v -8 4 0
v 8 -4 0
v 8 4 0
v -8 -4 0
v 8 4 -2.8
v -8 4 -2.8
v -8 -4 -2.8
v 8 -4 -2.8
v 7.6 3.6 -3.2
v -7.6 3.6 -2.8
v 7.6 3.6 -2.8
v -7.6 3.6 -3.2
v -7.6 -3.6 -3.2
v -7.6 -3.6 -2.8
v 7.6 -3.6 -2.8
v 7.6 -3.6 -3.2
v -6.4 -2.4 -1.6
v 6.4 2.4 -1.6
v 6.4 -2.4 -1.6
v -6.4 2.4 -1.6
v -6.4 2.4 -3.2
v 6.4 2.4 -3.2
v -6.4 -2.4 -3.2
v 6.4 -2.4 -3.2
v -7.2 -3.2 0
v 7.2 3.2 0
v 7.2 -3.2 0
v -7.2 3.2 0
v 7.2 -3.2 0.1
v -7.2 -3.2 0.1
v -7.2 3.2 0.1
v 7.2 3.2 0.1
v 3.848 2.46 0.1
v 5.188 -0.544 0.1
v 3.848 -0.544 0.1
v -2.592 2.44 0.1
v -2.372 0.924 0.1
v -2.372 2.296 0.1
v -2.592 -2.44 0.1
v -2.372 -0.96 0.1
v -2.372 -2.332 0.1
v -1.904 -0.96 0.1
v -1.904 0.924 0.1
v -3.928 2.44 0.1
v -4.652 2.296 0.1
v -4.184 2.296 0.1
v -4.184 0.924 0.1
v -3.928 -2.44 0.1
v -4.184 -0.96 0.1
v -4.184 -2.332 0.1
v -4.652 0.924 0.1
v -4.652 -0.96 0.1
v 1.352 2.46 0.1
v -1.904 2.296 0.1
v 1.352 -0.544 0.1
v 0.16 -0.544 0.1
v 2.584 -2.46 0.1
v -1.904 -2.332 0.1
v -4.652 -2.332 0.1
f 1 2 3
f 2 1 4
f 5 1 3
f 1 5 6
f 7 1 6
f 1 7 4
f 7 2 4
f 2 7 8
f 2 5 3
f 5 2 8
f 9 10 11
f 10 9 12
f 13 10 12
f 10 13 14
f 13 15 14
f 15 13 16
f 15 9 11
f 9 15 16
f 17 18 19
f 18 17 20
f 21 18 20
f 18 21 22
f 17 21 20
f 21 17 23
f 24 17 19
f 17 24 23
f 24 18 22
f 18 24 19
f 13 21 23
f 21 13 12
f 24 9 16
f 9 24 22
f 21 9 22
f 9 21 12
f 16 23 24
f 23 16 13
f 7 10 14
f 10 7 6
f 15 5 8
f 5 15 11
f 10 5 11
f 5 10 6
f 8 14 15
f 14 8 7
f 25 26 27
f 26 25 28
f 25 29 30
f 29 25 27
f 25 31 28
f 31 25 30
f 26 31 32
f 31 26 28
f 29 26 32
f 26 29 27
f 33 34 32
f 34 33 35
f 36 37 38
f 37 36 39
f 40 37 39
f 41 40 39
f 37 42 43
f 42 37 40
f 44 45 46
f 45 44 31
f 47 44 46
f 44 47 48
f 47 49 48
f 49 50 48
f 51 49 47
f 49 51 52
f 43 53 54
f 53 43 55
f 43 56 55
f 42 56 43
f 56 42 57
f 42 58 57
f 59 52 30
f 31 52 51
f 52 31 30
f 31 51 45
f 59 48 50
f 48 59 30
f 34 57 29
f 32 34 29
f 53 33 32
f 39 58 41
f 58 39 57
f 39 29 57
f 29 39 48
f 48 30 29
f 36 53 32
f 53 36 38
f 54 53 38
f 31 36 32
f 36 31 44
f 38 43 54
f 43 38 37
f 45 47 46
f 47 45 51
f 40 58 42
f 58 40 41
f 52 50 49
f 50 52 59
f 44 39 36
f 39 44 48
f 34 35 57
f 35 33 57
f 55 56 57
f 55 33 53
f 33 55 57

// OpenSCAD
// file: ../p/box5-12.scad
use <../lib.scad>
function ldraw_lib__box5_12() = [
// 0 Box with 5 Faces without Any Edges
// 0 Name: box5-12.dat
// 0 Author: Chris Dee [cwdee]
// 0 !LDRAW_ORG Primitive UPDATE 2009-02
// 0 !LICENSE Licensed under CC BY 4.0 : see CAreadme.txt
// 
// 0 BFC CERTIFY CCW
  [0,"BFC","CERTIFY"],
  [0,"BFC","CCW"],
// 
// 0 !HISTORY 2009-09-03 [PTadmin] Official Update 2009-02
// 
// 
// 4 16 1 1 1 1 1 -1 -1 1 -1 -1 1 1
  [4,16,1,1,1,1,1,-1,-1,1,-1,-1,1,1],
// 4 16 -1 0 1 1 0 1 1 1 1 -1 1 1
  [4,16,-1,0,1,1,0,1,1,1,1,-1,1,1],
// 4 16 -1 0 -1 -1 0 1 -1 1 1 -1 1 -1
  [4,16,-1,0,-1,-1,0,1,-1,1,1,-1,1,-1],
// 4 16 1 0 -1 -1 0 -1 -1 1 -1 1 1 -1
  [4,16,1,0,-1,-1,0,-1,-1,1,-1,1,1,-1],
// 4 16 1 0 1 1 0 -1 1 1 -1 1 1 1
  [4,16,1,0,1,1,0,-1,1,1,-1,1,1,1],
// 0
];
module ldraw_lib__box5_12(step=0, col=false, unit=2/5, alt=false, line=0.2, solid=!$preview)
    makepoly(ldraw_lib__box5_12(), step=step, col=col, unit=unit, alt=alt, line=line, solid=solid);
ldraw_lib__box5_12(line=0.2);
// file: ../p/box5.scad
use <../lib.scad>
function ldraw_lib__box5() = [
// 0 Box with 5 Faces and All Edges
// 0 Name: box5.dat
// 0 Author: James Jessiman
// 0 !LDRAW_ORG Primitive UPDATE 2012-01
// 0 !LICENSE Licensed under CC BY 4.0 : see CAreadme.txt
// 
// 0 BFC CERTIFY CCW
  [0,"BFC","CERTIFY"],
  [0,"BFC","CCW"],
// 
// 0 !HISTORY 2002-04-03 [sbliss] Modified for BFC compliance
// 0 !HISTORY 2002-04-25 [PTadmin] Official Update 2002-02
// 0 !HISTORY 2007-06-24 [PTadmin] Header formatted for Contributor Agreement
// 0 !HISTORY 2008-07-01 [PTadmin] Official Update 2008-01
// 0 !HISTORY 2012-02-16 [Philo] Changed to CCW
// 0 !HISTORY 2012-03-30 [PTadmin] Official Update 2012-01
// 
// 
// 2 24 1 1 1 -1 1 1
  [2,24,1,1,1,-1,1,1],
// 2 24 -1 1 1 -1 1 -1
  [2,24,-1,1,1,-1,1,-1],
// 2 24 -1 1 -1 1 1 -1
  [2,24,-1,1,-1,1,1,-1],
// 2 24 1 1 -1 1 1 1
  [2,24,1,1,-1,1,1,1],
// 2 24 1 0 1 -1 0 1
  [2,24,1,0,1,-1,0,1],
// 2 24 -1 0 1 -1 0 -1
  [2,24,-1,0,1,-1,0,-1],
// 2 24 -1 0 -1 1 0 -1
  [2,24,-1,0,-1,1,0,-1],
// 2 24 1 0 -1 1 0 1
  [2,24,1,0,-1,1,0,1],
// 2 24 1 0 1 1 1 1
  [2,24,1,0,1,1,1,1],
// 2 24 -1 0 1 -1 1 1
  [2,24,-1,0,1,-1,1,1],
// 2 24 1 0 -1 1 1 -1
  [2,24,1,0,-1,1,1,-1],
// 2 24 -1 0 -1 -1 1 -1
  [2,24,-1,0,-1,-1,1,-1],
// 4 16 -1 1 1 1 1 1 1 1 -1 -1 1 -1
  [4,16,-1,1,1,1,1,1,1,1,-1,-1,1,-1],
// 4 16 -1 1 1 -1 0 1 1 0 1 1 1 1
  [4,16,-1,1,1,-1,0,1,1,0,1,1,1,1],
// 4 16 -1 1 -1 -1 0 -1 -1 0 1 -1 1 1
  [4,16,-1,1,-1,-1,0,-1,-1,0,1,-1,1,1],
// 4 16 1 1 -1 1 0 -1 -1 0 -1 -1 1 -1
  [4,16,1,1,-1,1,0,-1,-1,0,-1,-1,1,-1],
// 4 16 1 1 1 1 0 1 1 0 -1 1 1 -1
  [4,16,1,1,1,1,0,1,1,0,-1,1,1,-1],
];
module ldraw_lib__box5(step=0, col=false, unit=2/5, alt=false, line=0.2, solid=!$preview)
    makepoly(ldraw_lib__box5(), step=step, col=col, unit=unit, alt=alt, line=line, solid=solid);
ldraw_lib__box5(line=0.2);
// file: ../p/box4.scad
use <../lib.scad>
function ldraw_lib__box4() = [
// 0 Box with 4 Faces (2 Parallel Pairs) and All Edges
// 0 Name: box4.dat
// 0 Author: James Jessiman
// 0 !LDRAW_ORG Primitive UPDATE 2012-01
// 0 !LICENSE Licensed under CC BY 4.0 : see CAreadme.txt
// 
// 0 BFC CERTIFY CCW
  [0,"BFC","CERTIFY"],
  [0,"BFC","CCW"],
// 
// 0 !HISTORY 2002-04-03 [sbliss] Modified for BFC compliance
// 0 !HISTORY 2002-04-25 [PTadmin] Official Update 2002-02
// 0 !HISTORY 2007-06-24 [PTadmin] Header formatted for Contributor Agreement
// 0 !HISTORY 2008-07-01 [PTadmin] Official Update 2008-01
// 0 !HISTORY 2012-02-16 [Philo] Changed to CCW
// 0 !HISTORY 2012-03-30 [PTadmin] Official Update 2012-01
// 
// 
// 2 24 1 1 1 -1 1 1
  [2,24,1,1,1,-1,1,1],
// 2 24 -1 1 1 -1 1 -1
  [2,24,-1,1,1,-1,1,-1],
// 2 24 -1 1 -1 1 1 -1
  [2,24,-1,1,-1,1,1,-1],
// 2 24 1 1 -1 1 1 1
  [2,24,1,1,-1,1,1,1],
// 2 24 1 0 1 -1 0 1
  [2,24,1,0,1,-1,0,1],
// 2 24 -1 0 1 -1 0 -1
  [2,24,-1,0,1,-1,0,-1],
// 2 24 -1 0 -1 1 0 -1
  [2,24,-1,0,-1,1,0,-1],
// 2 24 1 0 -1 1 0 1
  [2,24,1,0,-1,1,0,1],
// 2 24 1 0 1 1 1 1
  [2,24,1,0,1,1,1,1],
// 2 24 -1 0 1 -1 1 1
  [2,24,-1,0,1,-1,1,1],
// 2 24 1 0 -1 1 1 -1
  [2,24,1,0,-1,1,1,-1],
// 2 24 -1 0 -1 -1 1 -1
  [2,24,-1,0,-1,-1,1,-1],
// 4 16 -1 1 1 -1 0 1 1 0 1 1 1 1
  [4,16,-1,1,1,-1,0,1,1,0,1,1,1,1],
// 4 16 -1 1 -1 -1 0 -1 -1 0 1 -1 1 1
  [4,16,-1,1,-1,-1,0,-1,-1,0,1,-1,1,1],
// 4 16 1 1 -1 1 0 -1 -1 0 -1 -1 1 -1
  [4,16,1,1,-1,1,0,-1,-1,0,-1,-1,1,-1],
// 4 16 1 1 1 1 0 1 1 0 -1 1 1 -1
  [4,16,1,1,1,1,0,1,1,0,-1,1,1,-1],
];
module ldraw_lib__box4(step=0, col=false, unit=2/5, alt=false, line=0.2, solid=!$preview)
    makepoly(ldraw_lib__box4(), step=step, col=col, unit=unit, alt=alt, line=line, solid=solid);
ldraw_lib__box4(line=0.2);
// file: 821577e.scad
use <../lib.scad>
use <../p/box5-12.scad>
function ldraw_lib__821577e() = [
// 0 Sticker  0.8 x  1.8 with Car and Red Straight Arrow Up
// 0 Name: 821577e.dat
// 0 Author: Evert-Jan Boer [ejboer]
// 0 !LDRAW_ORG Part UPDATE 2026-07
// 0 !LICENSE Licensed under CC BY 4.0 : see CAreadme.txt
// 
// 0 BFC CERTIFY CCW
  [0,"BFC","CERTIFY"],
  [0,"BFC","CCW"],
// 
// 0 !CATEGORY Sticker
// 0 !KEYWORDS Multi Control, Set 8082
// 
// 0 !HISTORY 2026-07-30 [OrionP] Official Update 2026-07
// 
// 1 16 0 -.25 0 18 0 0 0 0.25 0 0 0 8 box5-12.dat
  [1,16,0,-.25,0,18,0,0,0,0.25,0,0,0,8, ldraw_lib__box5_12()],
// 4 16 12.97 -.25 1.36 9.62 -.25 1.36 9.62 -.25 -6.15 18 -.25 -8
  [4,16,12.97,-.25,1.36,9.62,-.25,1.36,9.62,-.25,-6.15,18,-.25,-8],
// 4 16 -5.93 -.25 -5.74 -5.93 -.25 -2.31 -6.48 -.25 6.1 -6.48 -.25 -6.1
  [4,16,-5.93,-.25,-5.74,-5.93,-.25,-2.31,-6.48,-.25,6.1,-6.48,-.25,-6.1],
// 3 16 -6.48 -.25 6.1 -5.93 -.25 -2.31 -5.93 -.25 2.4
  [3,16,-6.48,-.25,6.1,-5.93,-.25,-2.31,-5.93,-.25,2.4],
// 3 16 -6.48 -.25 6.1 -5.93 -.25 2.4 -5.93 -.25 5.83
  [3,16,-6.48,-.25,6.1,-5.93,-.25,2.4,-5.93,-.25,5.83],
// 4 16 -5.93 -.25 -2.31 -4.76 -.25 -2.31 -4.76 -.25 2.4 -5.93 -.25 2.4
  [4,16,-5.93,-.25,-2.31,-4.76,-.25,-2.31,-4.76,-.25,2.4,-5.93,-.25,2.4],
// 4 16 -9.82 -.25 -6.1 -10.46 -.25 -5.74 -11.63 -.25 -5.74 -18 -.25 -8
  [4,16,-9.82,-.25,-6.1,-10.46,-.25,-5.74,-11.63,-.25,-5.74,-18,-.25,-8],
// 4 16 -10.46 -.25 -5.74 -9.82 -.25 -6.1 -9.82 -.25 6.1 -10.46 -.25 -2.31
  [4,16,-10.46,-.25,-5.74,-9.82,-.25,-6.1,-9.82,-.25,6.1,-10.46,-.25,-2.31],
// 3 16 -9.82 -.25 6.1 -10.46 -.25 2.4 -10.46 -.25 -2.31
  [3,16,-9.82,-.25,6.1,-10.46,-.25,2.4,-10.46,-.25,-2.31],
// 3 16 -9.82 -.25 6.1 -10.46 -.25 5.83 -10.46 -.25 2.4
  [3,16,-9.82,-.25,6.1,-10.46,-.25,5.83,-10.46,-.25,2.4],
// 4 16 -10.46 -.25 2.4 -11.63 -.25 2.4 -11.63 -.25 -2.31 -10.46 -.25 -2.31
  [4,16,-10.46,-.25,2.4,-11.63,-.25,2.4,-11.63,-.25,-2.31,-10.46,-.25,-2.31],
// 4 16 3.38 -.25 -6.15 3.38 -.25 1.36 -4.76 -.25 -2.31 -4.76 -.25 -5.74
  [4,16,3.38,-.25,-6.15,3.38,-.25,1.36,-4.76,-.25,-2.31,-4.76,-.25,-5.74],
// 3 16 3.38 -.25 1.36 .4 -.25 1.36 -4.76 -.25 -2.31
  [3,16,3.38,-.25,1.36,.4,-.25,1.36,-4.76,-.25,-2.31],
// 4 16 -4.76 -.25 -2.31 .4 -.25 1.36 6.46 -.25 6.15 -4.76 -.25 2.4
  [4,16,-4.76,-.25,-2.31,.4,-.25,1.36,6.46,-.25,6.15,-4.76,-.25,2.4],
// 3 16 6.46 -.25 6.15 -4.76 -.25 5.83 -4.76 -.25 2.4
  [3,16,6.46,-.25,6.15,-4.76,-.25,5.83,-4.76,-.25,2.4],
// 3 16 -18 -.25 8 -11.63 -.25 2.4 -11.63 -.25 5.83
  [3,16,-18,-.25,8,-11.63,-.25,2.4,-11.63,-.25,5.83],
// 4 16 -11.63 -.25 -2.31 -11.63 -.25 2.4 -18 -.25 8 -18 -.25 -8
  [4,16,-11.63,-.25,-2.31,-11.63,-.25,2.4,-18,-.25,8,-18,-.25,-8],
// 3 16 -11.63 -.25 -5.74 -11.63 -.25 -2.31 -18 -.25 -8
  [3,16,-11.63,-.25,-5.74,-11.63,-.25,-2.31,-18,-.25,-8],
// 4 16 -10.46 -.25 5.83 -9.82 -.25 6.1 -18 -.25 8 -11.63 -.25 5.83
  [4,16,-10.46,-.25,5.83,-9.82,-.25,6.1,-18,-.25,8,-11.63,-.25,5.83],
// 3 16 18 -.25 8 6.46 -.25 6.15 12.97 -.25 1.36
  [3,16,18,-.25,8,6.46,-.25,6.15,12.97,-.25,1.36],
// 3 16 18 -.25 8 12.97 -.25 1.36 18 -.25 -8
  [3,16,18,-.25,8,12.97,-.25,1.36,18,-.25,-8],
// 3 16 18 -.25 -8 9.62 -.25 -6.15 3.38 -.25 -6.15
  [3,16,18,-.25,-8,9.62,-.25,-6.15,3.38,-.25,-6.15],
// 4 16 -6.48 -.25 6.1 -5.93 -.25 5.83 -4.76 -.25 5.83 6.46 -.25 6.15
  [4,16,-6.48,-.25,6.1,-5.93,-.25,5.83,-4.76,-.25,5.83,6.46,-.25,6.15],
// 4 16 -9.82 -.25 6.1 -6.48 -.25 6.1 6.46 -.25 6.15 18 -.25 8
  [4,16,-9.82,-.25,6.1,-6.48,-.25,6.1,6.46,-.25,6.15,18,-.25,8],
// 3 16 18 -.25 8 -18 -.25 8 -9.82 -.25 6.1
  [3,16,18,-.25,8,-18,-.25,8,-9.82,-.25,6.1],
// 4 16 18 -.25 -8 3.38 -.25 -6.15 -5.93 -.25 -5.74 -6.48 -.25 -6.1
  [4,16,18,-.25,-8,3.38,-.25,-6.15,-5.93,-.25,-5.74,-6.48,-.25,-6.1],
// 3 16 -5.93 -.25 -5.74 3.38 -.25 -6.15 -4.76 -.25 -5.74
  [3,16,-5.93,-.25,-5.74,3.38,-.25,-6.15,-4.76,-.25,-5.74],
// 4 16 -18 -.25 -8 18 -.25 -8 -6.48 -.25 -6.1 -9.82 -.25 -6.1
  [4,16,-18,-.25,-8,18,-.25,-8,-6.48,-.25,-6.1,-9.82,-.25,-6.1],
// 
// 0 BFC NOCLIP
  [0,"BFC","NOCLIP"],
// 
// 4 14 -5.93 -.25 -2.31 -5.93 -.25 -5.74 -4.76 -.25 -5.74 -4.76 -.25 -2.31
  [4,14,-5.93,-.25,-2.31,-5.93,-.25,-5.74,-4.76,-.25,-5.74,-4.76,-.25,-2.31],
// 4 14 -11.63 -.25 -2.31 -11.63 -.25 -5.74 -10.46 -.25 -5.74 -10.46 -.25 -2.31
  [4,14,-11.63,-.25,-2.31,-11.63,-.25,-5.74,-10.46,-.25,-5.74,-10.46,-.25,-2.31],
// 4 14 -5.93 -.25 5.83 -5.93 -.25 2.4 -4.76 -.25 2.4 -4.76 -.25 5.83
  [4,14,-5.93,-.25,5.83,-5.93,-.25,2.4,-4.76,-.25,2.4,-4.76,-.25,5.83],
// 4 14 -11.63 -.25 5.83 -11.63 -.25 2.4 -10.46 -.25 2.4 -10.46 -.25 5.83
  [4,14,-11.63,-.25,5.83,-11.63,-.25,2.4,-10.46,-.25,2.4,-10.46,-.25,5.83],
// 4 0 -9.82 -.25 6.1 -9.82 -.25 -6.1 -6.48 -.25 -6.1 -6.48 -.25 6.1
  [4,0,-9.82,-.25,6.1,-9.82,-.25,-6.1,-6.48,-.25,-6.1,-6.48,-.25,6.1],
// 3 4 6.46 -.25 6.15 9.62 -.25 1.36 12.97 -.25 1.36
  [3,4,6.46,-.25,6.15,9.62,-.25,1.36,12.97,-.25,1.36],
// 3 4 6.46 -.25 6.15 9.62 -.25 -6.15 9.62 -.25 1.36
  [3,4,6.46,-.25,6.15,9.62,-.25,-6.15,9.62,-.25,1.36],
// 3 4 6.46 -.25 6.15 .4 -.25 1.36 3.38 -.25 1.36
  [3,4,6.46,-.25,6.15,.4,-.25,1.36,3.38,-.25,1.36],
// 4 4 6.46 -.25 6.15 3.38 -.25 1.36 3.38 -.25 -6.15 9.62 -.25 -6.15
  [4,4,6.46,-.25,6.15,3.38,-.25,1.36,3.38,-.25,-6.15,9.62,-.25,-6.15],
];
module ldraw_lib__821577e(step=0, col=false, unit=2/5, alt=false, line=0.2, solid=!$preview)
    makepoly(ldraw_lib__821577e(), step=step, col=col, unit=unit, alt=alt, line=line, solid=solid);
ldraw_lib__821577e(line=0.2);
// file: s/3069bs01.scad
use <../../lib.scad>
use <../../p/box4.scad>
use <../../p/box5.scad>
function ldraw_lib__s__3069bs01() = [
// 0 ~Tile  1 x  2 with Groove without Top Face
// 0 Name: s\3069bs01.dat
// 0 Author: Santeri Piippo [arezey]
// 0 !LDRAW_ORG Subpart UPDATE 2010-02
// 0 !LICENSE Licensed under CC BY 4.0 : see CAreadme.txt
// 
// 0 BFC CERTIFY CCW
  [0,"BFC","CERTIFY"],
  [0,"BFC","CCW"],
// 
// 0 !HISTORY 2010-07-05 [PTadmin] Official Update 2010-02
// 
// 
// 1 16 0 0 0 20 0 0 0 7 0 0 0 10 box4.dat
  [1,16,0,0,0,20,0,0,0,7,0,0,0,10, ldraw_lib__box4()],
// 1 16 0 7 0 19 0 0 0 1 0 0 0 9 box4.dat
  [1,16,0,7,0,19,0,0,0,1,0,0,0,9, ldraw_lib__box4()],
// 0 BFC INVERTNEXT
  [0,"BFC","INVERTNEXT"],
// 1 16 0 8 0 16 0 0 0 -4 0 0 0 6 box5.dat
  [1,16,0,8,0,16,0,0,0,-4,0,0,0,6, ldraw_lib__box5()],
// 4 16 -19 8 9 -16 8 6 -16 8 -6 -19 8 -9
  [4,16,-19,8,9,-16,8,6,-16,8,-6,-19,8,-9],
// 4 16 19 8 -9 16 8 -6 16 8 6 19 8 9
  [4,16,19,8,-9,16,8,-6,16,8,6,19,8,9],
// 4 16 19 8 9 16 8 6 -16 8 6 -19 8 9
  [4,16,19,8,9,16,8,6,-16,8,6,-19,8,9],
// 4 16 -19 8 -9 -16 8 -6 16 8 -6 19 8 -9
  [4,16,-19,8,-9,-16,8,-6,16,8,-6,19,8,-9],
// 4 16 -20 7 10 -19 7 9 -19 7 -9 -20 7 -10
  [4,16,-20,7,10,-19,7,9,-19,7,-9,-20,7,-10],
// 4 16 20 7 -10 19 7 -9 19 7 9 20 7 10
  [4,16,20,7,-10,19,7,-9,19,7,9,20,7,10],
// 4 16 20 7 10 19 7 9 -19 7 9 -20 7 10
  [4,16,20,7,10,19,7,9,-19,7,9,-20,7,10],
// 4 16 -20 7 -10 -19 7 -9 19 7 -9 20 7 -10
  [4,16,-20,7,-10,-19,7,-9,19,7,-9,20,7,-10],
// 0 //
];
module ldraw_lib__s__3069bs01(step=0, col=false, unit=2/5, alt=false, line=0.2, solid=!$preview)
    makepoly(ldraw_lib__s__3069bs01(), step=step, col=col, unit=unit, alt=alt, line=line, solid=solid);
ldraw_lib__s__3069bs01(line=0.2);
// file: 821577f.scad
use <../lib.scad>
use <821577e.scad>
function ldraw_lib__821577f() = [
// 0 Sticker  0.8 x  1.8 with Car and Red Straight Arrow Down
// 0 Name: 821577f.dat
// 0 Author: Evert-Jan Boer [ejboer]
// 0 !LDRAW_ORG Part UPDATE 2026-07
// 0 !LICENSE Licensed under CC BY 4.0 : see CAreadme.txt
// 
// 0 BFC CERTIFY CCW
  [0,"BFC","CERTIFY"],
  [0,"BFC","CCW"],
// 
// 0 !CATEGORY Sticker
// 0 !KEYWORDS Multi Control, Set 8082
// 
// 0 !HISTORY 2026-07-30 [OrionP] Official Update 2026-07
// 
// 1 16 0 0 0 1 0 0 0 1 0 0 0 -1 821577e.dat
  [1,16,0,0,0,1,0,0,0,1,0,0,0,-1, ldraw_lib__821577e()],
];
module ldraw_lib__821577f(step=0, col=false, unit=2/5, alt=false, line=0.2, solid=!$preview)
    makepoly(ldraw_lib__821577f(), step=step, col=col, unit=unit, alt=alt, line=line, solid=solid);
ldraw_lib__821577f(line=0.2);
// file: 3069b.scad
use <../lib.scad>
use <s/3069bs01.scad>
function ldraw_lib__3069b() = [
// 0 Tile  1 x  2 with Groove
// 0 Name: 3069b.dat
// 0 Author: Santeri Piippo [arezey]
// 0 !LDRAW_ORG Part UPDATE 2010-02
// 0 !LICENSE Licensed under CC BY 4.0 : see CAreadme.txt
// 
// 0 BFC CERTIFY CCW
  [0,"BFC","CERTIFY"],
  [0,"BFC","CCW"],
// 
// 0 !KEYWORDS BrickLink 3069
// 
// 0 !HISTORY 2010-07-05 [PTadmin] Official Update 2010-02
// 
// 
// 4 16 20 0 -10 20 0 10 -20 0 10 -20 0 -10
  [4,16,20,0,-10,20,0,10,-20,0,10,-20,0,-10],
// 1 16 0 0 0 1 0 0 0 1 0 0 0 1 s\3069bs01.dat
  [1,16,0,0,0,1,0,0,0,1,0,0,0,1, ldraw_lib__s__3069bs01()],
// 0 //
];
module ldraw_lib__3069b(step=0, col=false, unit=2/5, alt=false, line=0.2, solid=!$preview)
    makepoly(ldraw_lib__3069b(), step=step, col=col, unit=unit, alt=alt, line=line, solid=solid);
ldraw_lib__3069b(line=0.2);
// main file
use <../lib.scad>
use <3069b.scad>
use <821577f.scad>
function ldraw_lib__3069bd1v() = [
// 0 Tile  1 x  2 with Car and Red Straight Arrow Down Sticker
// 0 Name: 3069bd1v.dat
// 0 Author: Evert-Jan Boer [ejboer]
// 0 !LDRAW_ORG Shortcut UPDATE 2026-07
// 0 !LICENSE Licensed under CC BY 4.0 : see CAreadme.txt
// 
// 0 BFC CERTIFY CCW
  [0,"BFC","CERTIFY"],
  [0,"BFC","CCW"],
// 
// 0 !CATEGORY Sticker Shortcut
// 0 !KEYWORDS Bricklink 3069pb0083, Set 8082
// 
// 0 !HISTORY 2026-07-30 [OrionP] Official Update 2026-07
// 
// 1 16 0 0 0 1 0 0 0 1 0 0 0 1 3069b.dat
  [1,16,0,0,0,1,0,0,0,1,0,0,0,1, ldraw_lib__3069b()],
// 1 16 0 0 0 1 0 0 0 1 0 0 0 1 821577f.dat
  [1,16,0,0,0,1,0,0,0,1,0,0,0,1, ldraw_lib__821577f()],
];
module ldraw_lib__3069bd1v(step=0, col=false, unit=2/5, alt=false, line=0.2, solid=!$preview)
    makepoly(ldraw_lib__3069bd1v(), step=step, col=col, unit=unit, alt=alt, line=line, solid=solid);
ldraw_lib__3069bd1v(line=0.2);
